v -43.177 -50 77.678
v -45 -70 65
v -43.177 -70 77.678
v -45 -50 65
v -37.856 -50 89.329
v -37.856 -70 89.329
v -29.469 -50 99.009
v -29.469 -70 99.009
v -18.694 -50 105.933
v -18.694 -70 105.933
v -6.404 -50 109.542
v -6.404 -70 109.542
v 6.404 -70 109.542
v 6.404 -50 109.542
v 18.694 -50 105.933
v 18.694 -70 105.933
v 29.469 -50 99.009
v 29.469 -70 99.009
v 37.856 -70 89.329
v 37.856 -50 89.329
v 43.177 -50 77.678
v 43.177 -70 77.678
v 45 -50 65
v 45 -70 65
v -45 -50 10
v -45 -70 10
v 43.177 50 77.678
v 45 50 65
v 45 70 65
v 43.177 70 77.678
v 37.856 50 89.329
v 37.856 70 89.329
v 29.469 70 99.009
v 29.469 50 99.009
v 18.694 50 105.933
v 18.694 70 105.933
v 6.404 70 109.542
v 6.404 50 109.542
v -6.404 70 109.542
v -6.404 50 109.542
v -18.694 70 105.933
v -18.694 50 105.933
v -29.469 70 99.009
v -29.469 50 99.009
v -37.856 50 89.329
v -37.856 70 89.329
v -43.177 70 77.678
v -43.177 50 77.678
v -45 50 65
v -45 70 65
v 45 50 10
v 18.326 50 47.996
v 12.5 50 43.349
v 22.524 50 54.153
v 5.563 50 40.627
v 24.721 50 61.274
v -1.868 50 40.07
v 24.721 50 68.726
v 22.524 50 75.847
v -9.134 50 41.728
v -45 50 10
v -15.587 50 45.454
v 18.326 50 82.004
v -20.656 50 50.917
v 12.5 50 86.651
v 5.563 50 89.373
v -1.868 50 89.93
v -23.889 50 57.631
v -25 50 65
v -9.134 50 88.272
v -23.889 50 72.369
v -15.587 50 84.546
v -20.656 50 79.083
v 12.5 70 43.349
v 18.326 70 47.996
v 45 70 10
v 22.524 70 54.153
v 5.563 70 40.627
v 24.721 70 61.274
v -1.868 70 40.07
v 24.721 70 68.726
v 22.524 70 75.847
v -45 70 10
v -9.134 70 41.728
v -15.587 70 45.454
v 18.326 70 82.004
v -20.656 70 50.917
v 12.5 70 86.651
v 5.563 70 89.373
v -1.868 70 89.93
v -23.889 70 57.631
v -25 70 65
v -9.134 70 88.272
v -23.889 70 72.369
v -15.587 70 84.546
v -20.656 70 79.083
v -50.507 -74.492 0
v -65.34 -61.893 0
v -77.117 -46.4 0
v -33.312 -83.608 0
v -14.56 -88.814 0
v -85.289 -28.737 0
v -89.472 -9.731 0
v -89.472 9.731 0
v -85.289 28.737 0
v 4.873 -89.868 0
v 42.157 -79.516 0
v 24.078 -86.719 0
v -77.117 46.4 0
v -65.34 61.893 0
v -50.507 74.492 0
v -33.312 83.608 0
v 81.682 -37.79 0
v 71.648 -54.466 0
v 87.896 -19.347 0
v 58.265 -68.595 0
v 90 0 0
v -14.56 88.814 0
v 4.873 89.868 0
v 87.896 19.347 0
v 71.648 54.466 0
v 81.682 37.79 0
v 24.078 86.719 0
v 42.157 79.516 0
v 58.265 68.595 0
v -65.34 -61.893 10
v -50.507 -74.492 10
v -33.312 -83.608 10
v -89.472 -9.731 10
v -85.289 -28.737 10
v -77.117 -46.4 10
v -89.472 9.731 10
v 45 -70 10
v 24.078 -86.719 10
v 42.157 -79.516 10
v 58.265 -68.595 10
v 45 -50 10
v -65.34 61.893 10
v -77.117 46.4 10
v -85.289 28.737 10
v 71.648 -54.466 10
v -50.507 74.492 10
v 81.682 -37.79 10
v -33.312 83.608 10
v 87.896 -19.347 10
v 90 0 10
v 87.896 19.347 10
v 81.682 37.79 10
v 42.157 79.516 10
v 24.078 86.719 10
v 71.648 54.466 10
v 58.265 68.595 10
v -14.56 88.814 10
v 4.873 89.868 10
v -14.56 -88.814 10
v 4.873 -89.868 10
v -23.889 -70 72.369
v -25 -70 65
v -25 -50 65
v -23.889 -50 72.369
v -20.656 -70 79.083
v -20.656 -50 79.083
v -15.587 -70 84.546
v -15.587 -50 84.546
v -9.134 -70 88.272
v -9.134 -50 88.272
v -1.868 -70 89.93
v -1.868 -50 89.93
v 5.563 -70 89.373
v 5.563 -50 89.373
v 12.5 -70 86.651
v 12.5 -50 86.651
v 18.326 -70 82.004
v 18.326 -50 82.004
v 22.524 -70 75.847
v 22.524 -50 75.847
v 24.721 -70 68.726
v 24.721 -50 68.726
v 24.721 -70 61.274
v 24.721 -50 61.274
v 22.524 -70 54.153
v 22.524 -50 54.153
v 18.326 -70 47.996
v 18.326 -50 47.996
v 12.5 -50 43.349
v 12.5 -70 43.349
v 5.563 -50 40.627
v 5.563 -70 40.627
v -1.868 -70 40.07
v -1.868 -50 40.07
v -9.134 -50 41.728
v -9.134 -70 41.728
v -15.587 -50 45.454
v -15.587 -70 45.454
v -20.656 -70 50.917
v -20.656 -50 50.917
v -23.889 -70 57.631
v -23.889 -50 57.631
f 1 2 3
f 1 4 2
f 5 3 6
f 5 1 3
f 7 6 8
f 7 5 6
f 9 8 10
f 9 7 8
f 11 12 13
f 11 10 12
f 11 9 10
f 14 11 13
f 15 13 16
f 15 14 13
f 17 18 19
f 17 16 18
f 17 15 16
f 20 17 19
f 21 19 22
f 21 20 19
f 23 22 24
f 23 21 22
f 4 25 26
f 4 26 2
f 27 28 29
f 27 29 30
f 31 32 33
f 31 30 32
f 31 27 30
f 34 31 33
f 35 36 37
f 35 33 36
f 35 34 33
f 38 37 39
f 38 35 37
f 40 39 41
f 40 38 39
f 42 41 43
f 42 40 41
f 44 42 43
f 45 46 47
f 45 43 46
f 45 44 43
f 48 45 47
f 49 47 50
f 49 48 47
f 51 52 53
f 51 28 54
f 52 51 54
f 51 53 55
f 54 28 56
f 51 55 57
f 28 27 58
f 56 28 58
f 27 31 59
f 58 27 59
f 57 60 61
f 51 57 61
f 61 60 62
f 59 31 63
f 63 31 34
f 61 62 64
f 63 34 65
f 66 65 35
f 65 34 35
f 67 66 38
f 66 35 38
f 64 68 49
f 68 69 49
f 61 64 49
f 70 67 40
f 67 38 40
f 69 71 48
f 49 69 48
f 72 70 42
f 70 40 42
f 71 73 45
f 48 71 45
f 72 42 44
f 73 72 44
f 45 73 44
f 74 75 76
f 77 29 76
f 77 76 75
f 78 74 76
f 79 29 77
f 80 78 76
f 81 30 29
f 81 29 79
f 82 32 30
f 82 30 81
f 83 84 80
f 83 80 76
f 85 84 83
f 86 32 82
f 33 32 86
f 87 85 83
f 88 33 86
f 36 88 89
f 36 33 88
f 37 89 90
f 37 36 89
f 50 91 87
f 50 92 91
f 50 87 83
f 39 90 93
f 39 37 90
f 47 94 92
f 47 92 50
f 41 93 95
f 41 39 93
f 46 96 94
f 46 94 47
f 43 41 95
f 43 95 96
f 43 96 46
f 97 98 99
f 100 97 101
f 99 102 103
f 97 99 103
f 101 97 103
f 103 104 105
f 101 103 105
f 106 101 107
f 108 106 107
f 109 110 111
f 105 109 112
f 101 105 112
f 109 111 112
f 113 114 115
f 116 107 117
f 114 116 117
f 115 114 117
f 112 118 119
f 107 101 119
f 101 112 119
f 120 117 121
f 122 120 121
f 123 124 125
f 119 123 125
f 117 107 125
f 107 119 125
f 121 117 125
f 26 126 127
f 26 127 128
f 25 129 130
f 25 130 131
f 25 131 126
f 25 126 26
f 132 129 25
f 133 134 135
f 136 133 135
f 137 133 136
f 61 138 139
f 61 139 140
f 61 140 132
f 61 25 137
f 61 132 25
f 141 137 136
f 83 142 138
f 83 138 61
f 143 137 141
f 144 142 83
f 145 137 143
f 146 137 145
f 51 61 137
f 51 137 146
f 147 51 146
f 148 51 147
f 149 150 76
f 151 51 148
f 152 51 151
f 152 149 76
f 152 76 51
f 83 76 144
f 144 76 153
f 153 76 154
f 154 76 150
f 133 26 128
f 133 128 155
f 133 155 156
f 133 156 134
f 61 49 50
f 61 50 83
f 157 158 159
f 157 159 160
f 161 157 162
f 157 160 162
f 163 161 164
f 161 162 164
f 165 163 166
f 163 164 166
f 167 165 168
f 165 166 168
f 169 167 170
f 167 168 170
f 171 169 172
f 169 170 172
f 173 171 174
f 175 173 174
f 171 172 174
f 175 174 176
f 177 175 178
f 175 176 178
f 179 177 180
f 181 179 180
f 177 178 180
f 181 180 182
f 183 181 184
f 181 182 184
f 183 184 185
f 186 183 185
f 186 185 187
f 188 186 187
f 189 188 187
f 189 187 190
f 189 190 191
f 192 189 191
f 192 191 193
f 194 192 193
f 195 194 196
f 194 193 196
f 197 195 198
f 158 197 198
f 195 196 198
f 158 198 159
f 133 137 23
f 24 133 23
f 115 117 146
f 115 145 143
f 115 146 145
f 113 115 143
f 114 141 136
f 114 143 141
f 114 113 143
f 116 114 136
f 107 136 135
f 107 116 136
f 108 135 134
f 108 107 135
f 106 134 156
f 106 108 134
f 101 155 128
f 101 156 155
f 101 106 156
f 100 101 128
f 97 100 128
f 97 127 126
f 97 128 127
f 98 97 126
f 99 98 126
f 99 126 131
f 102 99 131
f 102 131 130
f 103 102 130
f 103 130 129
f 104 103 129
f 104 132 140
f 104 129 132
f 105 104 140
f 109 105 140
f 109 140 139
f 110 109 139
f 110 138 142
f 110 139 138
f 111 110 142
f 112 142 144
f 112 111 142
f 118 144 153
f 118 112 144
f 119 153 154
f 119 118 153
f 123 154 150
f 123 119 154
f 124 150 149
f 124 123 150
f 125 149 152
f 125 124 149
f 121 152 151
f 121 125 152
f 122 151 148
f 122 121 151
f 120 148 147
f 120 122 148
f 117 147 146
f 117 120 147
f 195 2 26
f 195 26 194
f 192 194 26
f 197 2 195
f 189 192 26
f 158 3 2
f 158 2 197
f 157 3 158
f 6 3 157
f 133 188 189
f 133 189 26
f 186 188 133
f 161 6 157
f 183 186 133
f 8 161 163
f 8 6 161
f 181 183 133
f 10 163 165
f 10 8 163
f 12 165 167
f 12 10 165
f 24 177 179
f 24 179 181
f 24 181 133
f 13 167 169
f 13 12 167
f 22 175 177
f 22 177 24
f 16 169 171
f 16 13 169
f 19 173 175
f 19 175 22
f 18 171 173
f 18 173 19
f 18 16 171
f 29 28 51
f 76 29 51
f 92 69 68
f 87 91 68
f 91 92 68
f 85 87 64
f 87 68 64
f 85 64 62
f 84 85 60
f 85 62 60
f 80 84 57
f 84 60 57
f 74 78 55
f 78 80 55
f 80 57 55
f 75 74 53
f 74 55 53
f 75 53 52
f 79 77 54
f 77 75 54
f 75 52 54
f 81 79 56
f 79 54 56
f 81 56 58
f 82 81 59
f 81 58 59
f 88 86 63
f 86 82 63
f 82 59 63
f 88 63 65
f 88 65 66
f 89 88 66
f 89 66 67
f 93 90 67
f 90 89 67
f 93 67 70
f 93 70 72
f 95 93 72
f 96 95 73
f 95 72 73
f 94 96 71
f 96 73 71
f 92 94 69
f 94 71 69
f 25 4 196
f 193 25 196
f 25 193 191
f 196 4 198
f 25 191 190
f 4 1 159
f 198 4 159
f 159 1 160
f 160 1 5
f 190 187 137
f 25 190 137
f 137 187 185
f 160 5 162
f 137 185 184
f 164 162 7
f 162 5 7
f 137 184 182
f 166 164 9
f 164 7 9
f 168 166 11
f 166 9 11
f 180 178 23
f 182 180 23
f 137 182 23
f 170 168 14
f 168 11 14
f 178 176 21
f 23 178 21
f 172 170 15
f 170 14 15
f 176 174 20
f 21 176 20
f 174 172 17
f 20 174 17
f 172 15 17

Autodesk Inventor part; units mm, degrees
ref_plane "YZ Plane" through (0, 0, 0) normal (1, 0, 0) x (0, 1, 0)
ref_plane "XY Plane" through (0, 0, 0) normal (0, 0, 1) x (1, 0, 0)
sketch "Sketch1" plane through (0, 0, 0) normal (0, 0, 1) x (1, 0, 0)
  circle A0 centre (0, 0) radius 90
  dimension "d0" = 180
extrude "Extrusion1" add sketch "Sketch1" along normal blind 10
ref_plane "Work Plane1" through (0, 50, 0) normal (0, 1, 0) x (-1, 0, 0)
sketch "Sketch2" plane through (0, 50, 0) normal (0, 1, 0) x (-1, 0, 0)
  line L0 (90, 10) -> (-90, 10) projected
  line L1 (0, 10) -> (0, 110) construction
  arc A0 (45, 65) -> (0, 110) centre (0, 65) ccw
  line L2 (45, 65) -> (45, 10)
  line L3 (45, 10) -> (0, 10)
  arc A1 (0, 110) -> (-45, 65) centre (0, 65) ccw
  line L4 (-45, 65) -> (-45, 10)
  line L5 (-45, 10) -> (0, 10)
  circle A2 centre (0, 65) radius 25
  point P0 (0, 0)
  dimension "d4" = 45
  dimension "d5" = 100
  dimension "d6" = 50
extrude "Extrusion2" add sketch "Sketch2" along normal blind 20
mirror "Mirror1" about plane through (0, 0, 0) normal (0, 1, 0) of "Extrusion2"
properties part number "Platform"
